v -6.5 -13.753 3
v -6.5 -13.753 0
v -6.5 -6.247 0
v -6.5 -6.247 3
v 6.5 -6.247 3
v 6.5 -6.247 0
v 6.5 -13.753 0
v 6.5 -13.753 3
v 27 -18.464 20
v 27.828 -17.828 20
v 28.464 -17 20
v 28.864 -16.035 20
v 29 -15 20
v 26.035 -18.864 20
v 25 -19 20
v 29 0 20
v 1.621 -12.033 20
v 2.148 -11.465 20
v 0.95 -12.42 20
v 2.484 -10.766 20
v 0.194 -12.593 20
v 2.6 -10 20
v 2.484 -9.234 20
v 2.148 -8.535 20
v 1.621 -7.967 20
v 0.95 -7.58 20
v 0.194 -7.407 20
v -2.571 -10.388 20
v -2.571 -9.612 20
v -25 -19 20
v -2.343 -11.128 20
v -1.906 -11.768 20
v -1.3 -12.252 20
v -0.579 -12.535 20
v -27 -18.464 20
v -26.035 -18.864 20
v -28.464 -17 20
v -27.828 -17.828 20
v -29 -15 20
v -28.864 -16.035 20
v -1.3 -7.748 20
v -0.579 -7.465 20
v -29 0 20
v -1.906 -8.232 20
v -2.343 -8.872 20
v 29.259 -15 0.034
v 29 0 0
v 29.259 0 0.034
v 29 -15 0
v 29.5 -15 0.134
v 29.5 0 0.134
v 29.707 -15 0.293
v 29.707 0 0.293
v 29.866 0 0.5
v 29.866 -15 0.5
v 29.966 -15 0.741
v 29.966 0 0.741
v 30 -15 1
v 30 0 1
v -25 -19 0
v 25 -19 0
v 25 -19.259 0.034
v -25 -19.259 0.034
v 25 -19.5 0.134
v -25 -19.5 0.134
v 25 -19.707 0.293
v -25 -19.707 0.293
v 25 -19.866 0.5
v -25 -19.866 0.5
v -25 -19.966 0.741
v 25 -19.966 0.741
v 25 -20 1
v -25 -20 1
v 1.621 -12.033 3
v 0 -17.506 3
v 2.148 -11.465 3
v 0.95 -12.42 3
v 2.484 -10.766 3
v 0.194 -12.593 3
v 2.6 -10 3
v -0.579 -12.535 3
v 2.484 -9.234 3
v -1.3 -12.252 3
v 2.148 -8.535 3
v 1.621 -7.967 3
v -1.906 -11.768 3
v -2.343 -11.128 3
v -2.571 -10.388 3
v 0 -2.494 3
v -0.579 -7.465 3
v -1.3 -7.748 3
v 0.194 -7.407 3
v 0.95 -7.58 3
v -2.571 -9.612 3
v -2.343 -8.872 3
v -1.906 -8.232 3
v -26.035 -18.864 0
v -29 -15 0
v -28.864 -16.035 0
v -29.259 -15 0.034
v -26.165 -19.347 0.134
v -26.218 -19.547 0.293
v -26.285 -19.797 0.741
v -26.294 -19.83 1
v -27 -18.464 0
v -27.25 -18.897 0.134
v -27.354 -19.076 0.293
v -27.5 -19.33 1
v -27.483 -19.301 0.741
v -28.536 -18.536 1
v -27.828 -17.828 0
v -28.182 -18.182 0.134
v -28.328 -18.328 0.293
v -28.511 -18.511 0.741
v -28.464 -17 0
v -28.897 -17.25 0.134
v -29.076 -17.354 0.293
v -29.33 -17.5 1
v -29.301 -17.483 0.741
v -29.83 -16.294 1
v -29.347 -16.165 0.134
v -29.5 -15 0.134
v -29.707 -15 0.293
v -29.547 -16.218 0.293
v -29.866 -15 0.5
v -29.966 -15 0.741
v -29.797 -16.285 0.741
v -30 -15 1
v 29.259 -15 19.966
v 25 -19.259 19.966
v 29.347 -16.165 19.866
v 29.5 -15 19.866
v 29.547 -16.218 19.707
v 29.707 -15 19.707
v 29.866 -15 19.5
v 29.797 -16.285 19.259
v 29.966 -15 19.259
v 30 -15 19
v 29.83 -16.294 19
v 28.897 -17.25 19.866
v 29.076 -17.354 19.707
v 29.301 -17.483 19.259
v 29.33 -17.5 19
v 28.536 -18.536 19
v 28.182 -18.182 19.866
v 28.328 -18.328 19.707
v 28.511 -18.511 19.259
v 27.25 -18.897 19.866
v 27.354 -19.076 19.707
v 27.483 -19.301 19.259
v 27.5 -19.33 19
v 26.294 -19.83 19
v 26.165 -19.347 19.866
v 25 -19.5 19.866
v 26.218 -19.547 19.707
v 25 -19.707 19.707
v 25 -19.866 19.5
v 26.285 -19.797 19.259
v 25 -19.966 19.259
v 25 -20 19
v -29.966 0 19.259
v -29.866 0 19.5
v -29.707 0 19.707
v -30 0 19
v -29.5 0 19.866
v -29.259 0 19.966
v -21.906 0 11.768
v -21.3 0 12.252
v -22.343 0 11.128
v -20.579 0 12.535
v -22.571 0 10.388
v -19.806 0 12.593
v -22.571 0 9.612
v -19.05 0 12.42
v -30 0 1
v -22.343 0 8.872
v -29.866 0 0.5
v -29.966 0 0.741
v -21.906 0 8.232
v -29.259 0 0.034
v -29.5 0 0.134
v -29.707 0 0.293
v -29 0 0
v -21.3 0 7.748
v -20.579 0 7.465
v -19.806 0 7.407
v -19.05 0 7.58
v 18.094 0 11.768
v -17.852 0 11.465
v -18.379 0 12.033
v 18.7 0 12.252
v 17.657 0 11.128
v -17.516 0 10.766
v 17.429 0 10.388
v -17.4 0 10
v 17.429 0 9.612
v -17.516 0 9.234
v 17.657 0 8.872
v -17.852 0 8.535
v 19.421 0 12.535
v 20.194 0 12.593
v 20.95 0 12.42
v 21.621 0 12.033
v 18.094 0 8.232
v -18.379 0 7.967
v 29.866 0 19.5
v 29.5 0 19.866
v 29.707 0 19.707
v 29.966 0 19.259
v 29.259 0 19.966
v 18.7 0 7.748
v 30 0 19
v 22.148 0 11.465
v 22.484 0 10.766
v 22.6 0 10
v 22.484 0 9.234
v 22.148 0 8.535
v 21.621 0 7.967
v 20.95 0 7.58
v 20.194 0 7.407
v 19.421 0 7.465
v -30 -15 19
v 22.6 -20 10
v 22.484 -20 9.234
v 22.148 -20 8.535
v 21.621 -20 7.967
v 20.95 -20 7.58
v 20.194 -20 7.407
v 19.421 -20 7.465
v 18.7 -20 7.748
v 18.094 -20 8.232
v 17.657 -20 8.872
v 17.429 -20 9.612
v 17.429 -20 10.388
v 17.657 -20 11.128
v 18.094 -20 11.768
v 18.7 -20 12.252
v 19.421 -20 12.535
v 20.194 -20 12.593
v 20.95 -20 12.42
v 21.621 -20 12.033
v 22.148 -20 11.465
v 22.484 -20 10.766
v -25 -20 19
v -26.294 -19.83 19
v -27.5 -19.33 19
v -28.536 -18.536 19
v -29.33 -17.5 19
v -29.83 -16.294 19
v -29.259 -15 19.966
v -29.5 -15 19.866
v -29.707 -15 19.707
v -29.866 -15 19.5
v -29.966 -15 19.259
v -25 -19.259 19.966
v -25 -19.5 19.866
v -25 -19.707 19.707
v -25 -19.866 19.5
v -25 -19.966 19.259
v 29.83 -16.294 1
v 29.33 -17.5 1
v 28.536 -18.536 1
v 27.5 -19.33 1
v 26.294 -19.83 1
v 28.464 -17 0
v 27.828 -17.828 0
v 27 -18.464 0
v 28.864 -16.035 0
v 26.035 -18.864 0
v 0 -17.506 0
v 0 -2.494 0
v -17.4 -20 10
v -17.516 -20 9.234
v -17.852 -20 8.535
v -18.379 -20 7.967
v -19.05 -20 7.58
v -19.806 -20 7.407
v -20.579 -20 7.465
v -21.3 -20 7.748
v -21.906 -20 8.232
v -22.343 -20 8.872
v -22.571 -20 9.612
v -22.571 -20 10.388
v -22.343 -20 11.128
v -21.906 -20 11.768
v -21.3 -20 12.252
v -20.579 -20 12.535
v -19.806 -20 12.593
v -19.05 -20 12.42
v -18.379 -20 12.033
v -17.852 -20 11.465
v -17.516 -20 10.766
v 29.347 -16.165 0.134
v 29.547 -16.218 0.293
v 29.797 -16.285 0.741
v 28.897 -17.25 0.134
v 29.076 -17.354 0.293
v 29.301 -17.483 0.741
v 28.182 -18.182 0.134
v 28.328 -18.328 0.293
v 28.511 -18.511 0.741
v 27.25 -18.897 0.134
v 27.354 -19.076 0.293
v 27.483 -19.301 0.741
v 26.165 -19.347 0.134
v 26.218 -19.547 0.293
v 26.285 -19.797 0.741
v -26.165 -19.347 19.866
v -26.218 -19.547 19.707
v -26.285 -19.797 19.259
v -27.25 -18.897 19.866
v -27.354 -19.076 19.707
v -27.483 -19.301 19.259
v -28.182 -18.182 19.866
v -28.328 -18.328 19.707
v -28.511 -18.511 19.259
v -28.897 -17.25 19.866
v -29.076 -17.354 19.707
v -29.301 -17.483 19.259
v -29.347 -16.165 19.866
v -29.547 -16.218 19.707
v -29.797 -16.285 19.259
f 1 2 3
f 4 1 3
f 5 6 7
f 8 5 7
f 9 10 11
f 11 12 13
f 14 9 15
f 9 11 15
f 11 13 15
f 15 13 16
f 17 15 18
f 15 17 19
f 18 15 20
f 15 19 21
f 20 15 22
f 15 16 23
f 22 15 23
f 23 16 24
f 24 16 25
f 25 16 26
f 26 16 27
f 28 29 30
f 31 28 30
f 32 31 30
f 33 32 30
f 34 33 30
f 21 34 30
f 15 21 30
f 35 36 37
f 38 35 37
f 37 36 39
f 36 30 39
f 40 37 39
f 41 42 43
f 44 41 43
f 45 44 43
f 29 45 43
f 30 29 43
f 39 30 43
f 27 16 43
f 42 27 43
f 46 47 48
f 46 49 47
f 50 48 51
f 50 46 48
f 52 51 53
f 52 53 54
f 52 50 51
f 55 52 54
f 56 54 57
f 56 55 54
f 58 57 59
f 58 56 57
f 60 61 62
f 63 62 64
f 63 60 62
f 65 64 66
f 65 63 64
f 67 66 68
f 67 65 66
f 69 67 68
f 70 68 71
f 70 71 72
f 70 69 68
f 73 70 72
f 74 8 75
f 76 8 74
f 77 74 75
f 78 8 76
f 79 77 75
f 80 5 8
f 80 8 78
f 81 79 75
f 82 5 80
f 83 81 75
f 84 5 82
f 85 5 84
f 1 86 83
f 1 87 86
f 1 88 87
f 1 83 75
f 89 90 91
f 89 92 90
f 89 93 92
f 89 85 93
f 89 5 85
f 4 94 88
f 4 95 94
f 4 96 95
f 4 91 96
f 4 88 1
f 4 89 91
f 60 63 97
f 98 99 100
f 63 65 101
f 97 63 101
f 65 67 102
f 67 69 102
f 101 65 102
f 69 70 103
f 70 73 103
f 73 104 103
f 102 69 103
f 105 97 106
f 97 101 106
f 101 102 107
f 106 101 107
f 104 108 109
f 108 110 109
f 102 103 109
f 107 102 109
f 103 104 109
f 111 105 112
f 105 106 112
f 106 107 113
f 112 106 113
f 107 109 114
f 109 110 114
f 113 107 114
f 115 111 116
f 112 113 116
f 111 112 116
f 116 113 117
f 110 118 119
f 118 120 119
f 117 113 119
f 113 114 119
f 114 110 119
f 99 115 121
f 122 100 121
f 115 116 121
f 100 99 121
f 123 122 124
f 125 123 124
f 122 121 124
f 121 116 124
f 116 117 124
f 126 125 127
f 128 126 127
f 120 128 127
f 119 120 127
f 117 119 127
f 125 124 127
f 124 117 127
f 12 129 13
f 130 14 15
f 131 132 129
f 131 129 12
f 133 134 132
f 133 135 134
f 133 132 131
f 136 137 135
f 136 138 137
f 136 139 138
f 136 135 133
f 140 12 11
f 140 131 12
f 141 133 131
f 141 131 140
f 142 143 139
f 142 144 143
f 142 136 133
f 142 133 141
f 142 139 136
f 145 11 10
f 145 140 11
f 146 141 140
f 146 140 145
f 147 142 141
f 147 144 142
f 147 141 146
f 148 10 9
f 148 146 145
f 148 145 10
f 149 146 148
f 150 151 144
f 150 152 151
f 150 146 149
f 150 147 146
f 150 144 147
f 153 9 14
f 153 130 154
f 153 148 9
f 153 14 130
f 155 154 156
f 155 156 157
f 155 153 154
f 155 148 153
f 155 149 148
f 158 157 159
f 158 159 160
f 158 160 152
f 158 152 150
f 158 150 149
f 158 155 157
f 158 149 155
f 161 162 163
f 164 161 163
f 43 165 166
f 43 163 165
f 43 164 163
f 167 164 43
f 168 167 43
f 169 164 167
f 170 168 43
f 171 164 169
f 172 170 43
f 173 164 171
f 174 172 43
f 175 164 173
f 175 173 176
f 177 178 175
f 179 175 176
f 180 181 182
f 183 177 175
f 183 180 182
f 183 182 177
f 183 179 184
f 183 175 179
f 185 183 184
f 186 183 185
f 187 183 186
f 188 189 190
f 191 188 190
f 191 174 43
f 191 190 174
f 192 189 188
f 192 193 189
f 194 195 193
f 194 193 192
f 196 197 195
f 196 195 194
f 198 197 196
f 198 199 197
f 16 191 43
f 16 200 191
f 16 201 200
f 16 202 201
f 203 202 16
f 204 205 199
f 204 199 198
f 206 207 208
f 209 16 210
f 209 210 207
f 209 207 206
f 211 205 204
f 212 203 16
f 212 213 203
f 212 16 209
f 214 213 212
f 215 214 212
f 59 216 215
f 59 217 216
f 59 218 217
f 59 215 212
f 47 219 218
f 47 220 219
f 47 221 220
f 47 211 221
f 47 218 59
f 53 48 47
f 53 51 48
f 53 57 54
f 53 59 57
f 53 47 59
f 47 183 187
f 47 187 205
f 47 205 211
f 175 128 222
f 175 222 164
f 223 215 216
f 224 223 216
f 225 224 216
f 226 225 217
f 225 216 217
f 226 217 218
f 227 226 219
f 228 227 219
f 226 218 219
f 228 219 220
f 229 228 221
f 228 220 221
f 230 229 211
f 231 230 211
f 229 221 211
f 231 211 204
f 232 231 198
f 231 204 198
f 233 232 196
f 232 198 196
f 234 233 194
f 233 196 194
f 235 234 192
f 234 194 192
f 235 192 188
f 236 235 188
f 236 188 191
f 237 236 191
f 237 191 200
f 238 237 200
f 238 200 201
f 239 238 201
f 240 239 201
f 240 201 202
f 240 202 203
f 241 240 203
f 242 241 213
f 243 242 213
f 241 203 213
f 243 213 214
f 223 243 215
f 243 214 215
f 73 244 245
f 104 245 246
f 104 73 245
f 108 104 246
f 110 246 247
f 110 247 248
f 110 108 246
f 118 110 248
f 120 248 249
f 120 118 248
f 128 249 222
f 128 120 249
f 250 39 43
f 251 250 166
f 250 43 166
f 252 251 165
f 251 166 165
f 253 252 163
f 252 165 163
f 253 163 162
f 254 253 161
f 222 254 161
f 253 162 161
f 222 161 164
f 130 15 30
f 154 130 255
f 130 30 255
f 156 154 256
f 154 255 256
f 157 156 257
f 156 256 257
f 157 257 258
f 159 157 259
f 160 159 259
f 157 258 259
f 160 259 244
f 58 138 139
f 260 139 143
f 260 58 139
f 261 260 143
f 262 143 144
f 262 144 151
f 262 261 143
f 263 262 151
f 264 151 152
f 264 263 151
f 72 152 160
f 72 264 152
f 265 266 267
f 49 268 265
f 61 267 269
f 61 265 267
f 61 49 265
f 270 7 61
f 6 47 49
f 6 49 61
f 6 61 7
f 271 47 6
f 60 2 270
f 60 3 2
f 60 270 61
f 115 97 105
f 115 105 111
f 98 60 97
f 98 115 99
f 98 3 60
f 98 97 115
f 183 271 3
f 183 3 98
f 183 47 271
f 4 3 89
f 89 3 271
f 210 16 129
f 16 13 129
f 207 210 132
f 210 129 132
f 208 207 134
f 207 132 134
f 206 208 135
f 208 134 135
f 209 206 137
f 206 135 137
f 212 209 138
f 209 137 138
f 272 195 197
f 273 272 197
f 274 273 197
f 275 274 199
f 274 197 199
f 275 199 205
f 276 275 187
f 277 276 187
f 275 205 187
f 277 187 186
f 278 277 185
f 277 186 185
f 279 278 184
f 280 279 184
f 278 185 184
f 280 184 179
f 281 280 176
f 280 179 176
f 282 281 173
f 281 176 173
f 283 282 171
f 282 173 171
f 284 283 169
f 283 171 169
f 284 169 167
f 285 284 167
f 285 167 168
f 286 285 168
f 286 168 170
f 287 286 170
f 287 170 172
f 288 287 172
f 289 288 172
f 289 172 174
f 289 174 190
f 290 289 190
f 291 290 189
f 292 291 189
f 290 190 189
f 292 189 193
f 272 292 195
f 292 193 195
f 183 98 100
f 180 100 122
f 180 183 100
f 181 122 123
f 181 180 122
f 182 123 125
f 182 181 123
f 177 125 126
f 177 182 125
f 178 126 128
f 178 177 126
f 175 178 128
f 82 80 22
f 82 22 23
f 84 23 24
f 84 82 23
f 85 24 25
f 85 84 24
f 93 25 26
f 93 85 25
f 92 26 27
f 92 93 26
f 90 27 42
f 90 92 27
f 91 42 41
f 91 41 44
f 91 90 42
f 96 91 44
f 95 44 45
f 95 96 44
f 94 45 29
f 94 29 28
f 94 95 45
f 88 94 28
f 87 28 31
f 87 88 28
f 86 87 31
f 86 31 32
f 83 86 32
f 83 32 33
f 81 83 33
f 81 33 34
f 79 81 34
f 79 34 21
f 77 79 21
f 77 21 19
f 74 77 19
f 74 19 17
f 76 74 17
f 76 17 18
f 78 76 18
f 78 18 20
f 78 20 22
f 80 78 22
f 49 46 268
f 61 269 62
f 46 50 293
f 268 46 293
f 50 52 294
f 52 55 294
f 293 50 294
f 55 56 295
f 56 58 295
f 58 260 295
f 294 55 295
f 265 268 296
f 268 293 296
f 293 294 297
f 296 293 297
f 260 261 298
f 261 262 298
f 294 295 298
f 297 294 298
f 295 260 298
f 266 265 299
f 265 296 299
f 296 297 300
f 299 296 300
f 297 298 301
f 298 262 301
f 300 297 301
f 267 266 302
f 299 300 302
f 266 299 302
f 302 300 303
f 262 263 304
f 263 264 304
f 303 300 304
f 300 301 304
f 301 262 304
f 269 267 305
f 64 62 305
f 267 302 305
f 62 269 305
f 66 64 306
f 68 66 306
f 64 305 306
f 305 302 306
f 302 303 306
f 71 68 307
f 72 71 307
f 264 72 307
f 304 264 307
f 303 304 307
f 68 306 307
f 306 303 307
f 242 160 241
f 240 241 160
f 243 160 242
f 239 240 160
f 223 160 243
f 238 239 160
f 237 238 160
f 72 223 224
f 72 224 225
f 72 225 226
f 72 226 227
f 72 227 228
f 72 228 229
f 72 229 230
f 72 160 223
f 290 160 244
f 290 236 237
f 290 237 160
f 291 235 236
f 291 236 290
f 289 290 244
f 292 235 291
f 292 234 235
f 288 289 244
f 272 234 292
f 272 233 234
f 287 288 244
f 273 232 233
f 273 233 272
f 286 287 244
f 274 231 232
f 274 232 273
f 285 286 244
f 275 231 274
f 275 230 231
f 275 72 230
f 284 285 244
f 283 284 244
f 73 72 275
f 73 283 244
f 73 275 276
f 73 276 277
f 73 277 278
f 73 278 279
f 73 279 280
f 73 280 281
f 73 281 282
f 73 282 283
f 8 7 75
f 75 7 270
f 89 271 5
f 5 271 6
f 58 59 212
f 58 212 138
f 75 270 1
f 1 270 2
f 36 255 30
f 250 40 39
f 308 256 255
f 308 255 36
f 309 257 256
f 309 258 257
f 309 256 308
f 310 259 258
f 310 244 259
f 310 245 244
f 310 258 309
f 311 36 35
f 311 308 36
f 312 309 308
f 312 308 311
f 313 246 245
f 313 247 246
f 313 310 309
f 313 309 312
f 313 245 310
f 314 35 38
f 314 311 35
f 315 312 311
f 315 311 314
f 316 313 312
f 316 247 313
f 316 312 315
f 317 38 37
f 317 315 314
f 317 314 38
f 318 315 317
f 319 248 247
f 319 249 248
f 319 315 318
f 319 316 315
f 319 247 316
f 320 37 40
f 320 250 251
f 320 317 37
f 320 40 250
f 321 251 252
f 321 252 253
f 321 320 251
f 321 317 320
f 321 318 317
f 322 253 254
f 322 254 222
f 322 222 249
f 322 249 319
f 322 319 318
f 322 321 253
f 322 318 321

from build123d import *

# Parameters (mm, degrees)
SKETCH1_R           = 2.6
BOSS_EXTRUDE1_DEPTH = 20
SKETCH2_R           = 2.6
CUT_EXTRUDE1_DEPTH  = 20
CUT_EXTRUDE2_DEPTH  = 3
FILLET1_R           = 1


with BuildPart() as part:
    # Sketch1 → Boss-Extrude1 (new body)
    with BuildSketch(Plane.XY):
        with BuildLine():
            Line((-30, 0), (30, 0))
            Line((30, 0), (30, -15))
            ThreePointArc((30, -15), (28.535533906, -18.535533906), (25, -20))
            Line((25, -20), (-25, -20))
            ThreePointArc((-25, -20), (-28.535533906, -18.535533906), (-30, -15))
            Line((-30, -15), (-30, 0))
        make_face()
        with Locations((0, -10)):
            Circle(SKETCH1_R, mode=Mode.SUBTRACT)
    extrude(amount=BOSS_EXTRUDE1_DEPTH)

    # Sketch2 → Cut-Extrude1 (cut)
    with BuildSketch(Plane(origin=(0, 0, 0), x_dir=(1, 0, 0), z_dir=(0, 1, 0))):
        with Locations((-20, -10)):
            Circle(SKETCH2_R)
        with Locations((20, -10)):
            Circle(SKETCH2_R)
    extrude(amount=-CUT_EXTRUDE1_DEPTH, mode=Mode.SUBTRACT)

    # Sketch3 → Cut-Extrude2 (cut)
    with BuildSketch(Plane(origin=(0, 0, 0), x_dir=(-1, 0, 0), z_dir=(0, 0, -1))):
        Polygon((0, -17.505553499), (6.5, -13.75277675), (6.5, -6.24722325), (0, -2.494446501), (-6.5, -6.24722325), (-6.5, -13.75277675), align=None)
    extrude(amount=-CUT_EXTRUDE2_DEPTH, mode=Mode.SUBTRACT)

    # Fillet1
    fillet1_edges = [part.edges().sort_by_distance(p)[0] for p in [
        (0, -20, 20),
        (28.535533906, -18.535533906, 20),
        (30, -7.5, 20),
        (-30, -7.5, 20),
        (30, -7.5, 0),
        (28.535533906, -18.535533906, 0),
        (-28.535533906, -18.535533906, 20),
        (0, -20, 0),
        (-28.535533906, -18.535533906, 0),
        (-30, -7.5, 0),
    ]]
    fillet(fillet1_edges, radius=FILLET1_R)


solid = part.part
